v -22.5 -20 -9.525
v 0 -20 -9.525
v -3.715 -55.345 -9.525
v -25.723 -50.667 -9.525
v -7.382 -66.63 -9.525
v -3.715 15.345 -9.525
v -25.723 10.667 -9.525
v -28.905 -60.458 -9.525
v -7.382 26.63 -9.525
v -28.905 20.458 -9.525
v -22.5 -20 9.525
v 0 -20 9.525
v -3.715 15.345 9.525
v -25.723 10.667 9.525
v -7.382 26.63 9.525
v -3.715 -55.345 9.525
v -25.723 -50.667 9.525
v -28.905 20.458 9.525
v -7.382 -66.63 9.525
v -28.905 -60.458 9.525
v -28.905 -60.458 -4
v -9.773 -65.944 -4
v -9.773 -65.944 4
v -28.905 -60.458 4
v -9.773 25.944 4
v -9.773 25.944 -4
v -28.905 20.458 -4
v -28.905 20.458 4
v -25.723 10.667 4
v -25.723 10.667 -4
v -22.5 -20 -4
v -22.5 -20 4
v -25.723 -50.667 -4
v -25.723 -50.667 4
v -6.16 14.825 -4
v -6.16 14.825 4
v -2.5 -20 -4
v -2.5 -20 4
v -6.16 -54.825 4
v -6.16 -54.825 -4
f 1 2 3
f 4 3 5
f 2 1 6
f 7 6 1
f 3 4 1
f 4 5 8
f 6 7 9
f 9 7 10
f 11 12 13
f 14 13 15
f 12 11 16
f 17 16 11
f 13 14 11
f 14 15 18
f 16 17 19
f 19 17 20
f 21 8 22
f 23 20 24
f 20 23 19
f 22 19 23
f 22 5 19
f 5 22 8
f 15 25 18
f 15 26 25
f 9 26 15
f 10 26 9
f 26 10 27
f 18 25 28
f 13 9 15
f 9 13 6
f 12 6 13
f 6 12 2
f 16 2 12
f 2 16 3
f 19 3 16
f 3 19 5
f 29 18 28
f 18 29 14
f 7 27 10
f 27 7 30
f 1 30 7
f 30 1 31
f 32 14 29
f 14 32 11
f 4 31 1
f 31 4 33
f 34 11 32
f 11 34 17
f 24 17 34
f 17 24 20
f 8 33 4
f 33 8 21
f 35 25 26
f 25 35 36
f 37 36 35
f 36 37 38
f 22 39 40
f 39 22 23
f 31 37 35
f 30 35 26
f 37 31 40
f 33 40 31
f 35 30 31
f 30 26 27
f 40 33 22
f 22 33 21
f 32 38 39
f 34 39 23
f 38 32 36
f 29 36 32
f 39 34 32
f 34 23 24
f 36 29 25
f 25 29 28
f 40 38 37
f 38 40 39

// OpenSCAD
// file: discToCentralPiece.scad
include <MCAD/boxes.scad>

module discToCentral() {

	pWidth=40.9375;
	pLength=36.275;
	
	difference() {
		translate([0,-20,0]) {
			//cube([43,65,29],center=true);
			roundedBox([43,65,29],3,false);
		}
	
		
		union() {
			difference() {	
				linear_extrude(height=36.275, center=true) {
					polygon(
						points=[[0,0],[6.5,3.5],[26.5,3.5],[40.9375,-3.5],[40.9375,-44],[0,-44]],
						paths=[[0,1,2,3,4,5]]);
				}
			
			
			//The two top grooves
				translate([0,0,-15.08125]) cube([21.5,5.55625,5.55625]);
				translate([0,0,9.525]) cube([21.5,5.55625,5.55625]);
			
			//The two front cylindrical grooves
				translate([0,10,-12.298125]) rotate([90,0,0]) cylinder(h=45,r=2.783125);
				translate([0,10,12.298125]) rotate([90,0,0]) cylinder(h=45,r=2.783125);
				translate([0,-3,0]);
			}
		}
	}
}

discToCentral();
// main file
//include <centralPiece.scad>
use <MCAD/triangles.scad> 
use <discToCentralPiece.scad>

module discMount() {
difference() {
	union() {
		//disc piece
		rotate([0,0,0])
		translate([-170,-20,-9.525])
		difference() {
			intersection() {
				cylinder(r=340/2, h=19.05);
				
				translate([200,0,0]) rotate([0,0,180])
				union() {
					a_triangle(16,200,19.05);
					
					translate([0,0,19.05]) rotate([0,180,0]) a_triangle(16,-200,19.05);
				}
			}
			
			translate([0,0,-5])
			cylinder(r=295/2,h=35.05);
		}
			
	}

	translate([-170,-20,-4]) cylinder(r=335/2,h=8);

}
}

discMount();
